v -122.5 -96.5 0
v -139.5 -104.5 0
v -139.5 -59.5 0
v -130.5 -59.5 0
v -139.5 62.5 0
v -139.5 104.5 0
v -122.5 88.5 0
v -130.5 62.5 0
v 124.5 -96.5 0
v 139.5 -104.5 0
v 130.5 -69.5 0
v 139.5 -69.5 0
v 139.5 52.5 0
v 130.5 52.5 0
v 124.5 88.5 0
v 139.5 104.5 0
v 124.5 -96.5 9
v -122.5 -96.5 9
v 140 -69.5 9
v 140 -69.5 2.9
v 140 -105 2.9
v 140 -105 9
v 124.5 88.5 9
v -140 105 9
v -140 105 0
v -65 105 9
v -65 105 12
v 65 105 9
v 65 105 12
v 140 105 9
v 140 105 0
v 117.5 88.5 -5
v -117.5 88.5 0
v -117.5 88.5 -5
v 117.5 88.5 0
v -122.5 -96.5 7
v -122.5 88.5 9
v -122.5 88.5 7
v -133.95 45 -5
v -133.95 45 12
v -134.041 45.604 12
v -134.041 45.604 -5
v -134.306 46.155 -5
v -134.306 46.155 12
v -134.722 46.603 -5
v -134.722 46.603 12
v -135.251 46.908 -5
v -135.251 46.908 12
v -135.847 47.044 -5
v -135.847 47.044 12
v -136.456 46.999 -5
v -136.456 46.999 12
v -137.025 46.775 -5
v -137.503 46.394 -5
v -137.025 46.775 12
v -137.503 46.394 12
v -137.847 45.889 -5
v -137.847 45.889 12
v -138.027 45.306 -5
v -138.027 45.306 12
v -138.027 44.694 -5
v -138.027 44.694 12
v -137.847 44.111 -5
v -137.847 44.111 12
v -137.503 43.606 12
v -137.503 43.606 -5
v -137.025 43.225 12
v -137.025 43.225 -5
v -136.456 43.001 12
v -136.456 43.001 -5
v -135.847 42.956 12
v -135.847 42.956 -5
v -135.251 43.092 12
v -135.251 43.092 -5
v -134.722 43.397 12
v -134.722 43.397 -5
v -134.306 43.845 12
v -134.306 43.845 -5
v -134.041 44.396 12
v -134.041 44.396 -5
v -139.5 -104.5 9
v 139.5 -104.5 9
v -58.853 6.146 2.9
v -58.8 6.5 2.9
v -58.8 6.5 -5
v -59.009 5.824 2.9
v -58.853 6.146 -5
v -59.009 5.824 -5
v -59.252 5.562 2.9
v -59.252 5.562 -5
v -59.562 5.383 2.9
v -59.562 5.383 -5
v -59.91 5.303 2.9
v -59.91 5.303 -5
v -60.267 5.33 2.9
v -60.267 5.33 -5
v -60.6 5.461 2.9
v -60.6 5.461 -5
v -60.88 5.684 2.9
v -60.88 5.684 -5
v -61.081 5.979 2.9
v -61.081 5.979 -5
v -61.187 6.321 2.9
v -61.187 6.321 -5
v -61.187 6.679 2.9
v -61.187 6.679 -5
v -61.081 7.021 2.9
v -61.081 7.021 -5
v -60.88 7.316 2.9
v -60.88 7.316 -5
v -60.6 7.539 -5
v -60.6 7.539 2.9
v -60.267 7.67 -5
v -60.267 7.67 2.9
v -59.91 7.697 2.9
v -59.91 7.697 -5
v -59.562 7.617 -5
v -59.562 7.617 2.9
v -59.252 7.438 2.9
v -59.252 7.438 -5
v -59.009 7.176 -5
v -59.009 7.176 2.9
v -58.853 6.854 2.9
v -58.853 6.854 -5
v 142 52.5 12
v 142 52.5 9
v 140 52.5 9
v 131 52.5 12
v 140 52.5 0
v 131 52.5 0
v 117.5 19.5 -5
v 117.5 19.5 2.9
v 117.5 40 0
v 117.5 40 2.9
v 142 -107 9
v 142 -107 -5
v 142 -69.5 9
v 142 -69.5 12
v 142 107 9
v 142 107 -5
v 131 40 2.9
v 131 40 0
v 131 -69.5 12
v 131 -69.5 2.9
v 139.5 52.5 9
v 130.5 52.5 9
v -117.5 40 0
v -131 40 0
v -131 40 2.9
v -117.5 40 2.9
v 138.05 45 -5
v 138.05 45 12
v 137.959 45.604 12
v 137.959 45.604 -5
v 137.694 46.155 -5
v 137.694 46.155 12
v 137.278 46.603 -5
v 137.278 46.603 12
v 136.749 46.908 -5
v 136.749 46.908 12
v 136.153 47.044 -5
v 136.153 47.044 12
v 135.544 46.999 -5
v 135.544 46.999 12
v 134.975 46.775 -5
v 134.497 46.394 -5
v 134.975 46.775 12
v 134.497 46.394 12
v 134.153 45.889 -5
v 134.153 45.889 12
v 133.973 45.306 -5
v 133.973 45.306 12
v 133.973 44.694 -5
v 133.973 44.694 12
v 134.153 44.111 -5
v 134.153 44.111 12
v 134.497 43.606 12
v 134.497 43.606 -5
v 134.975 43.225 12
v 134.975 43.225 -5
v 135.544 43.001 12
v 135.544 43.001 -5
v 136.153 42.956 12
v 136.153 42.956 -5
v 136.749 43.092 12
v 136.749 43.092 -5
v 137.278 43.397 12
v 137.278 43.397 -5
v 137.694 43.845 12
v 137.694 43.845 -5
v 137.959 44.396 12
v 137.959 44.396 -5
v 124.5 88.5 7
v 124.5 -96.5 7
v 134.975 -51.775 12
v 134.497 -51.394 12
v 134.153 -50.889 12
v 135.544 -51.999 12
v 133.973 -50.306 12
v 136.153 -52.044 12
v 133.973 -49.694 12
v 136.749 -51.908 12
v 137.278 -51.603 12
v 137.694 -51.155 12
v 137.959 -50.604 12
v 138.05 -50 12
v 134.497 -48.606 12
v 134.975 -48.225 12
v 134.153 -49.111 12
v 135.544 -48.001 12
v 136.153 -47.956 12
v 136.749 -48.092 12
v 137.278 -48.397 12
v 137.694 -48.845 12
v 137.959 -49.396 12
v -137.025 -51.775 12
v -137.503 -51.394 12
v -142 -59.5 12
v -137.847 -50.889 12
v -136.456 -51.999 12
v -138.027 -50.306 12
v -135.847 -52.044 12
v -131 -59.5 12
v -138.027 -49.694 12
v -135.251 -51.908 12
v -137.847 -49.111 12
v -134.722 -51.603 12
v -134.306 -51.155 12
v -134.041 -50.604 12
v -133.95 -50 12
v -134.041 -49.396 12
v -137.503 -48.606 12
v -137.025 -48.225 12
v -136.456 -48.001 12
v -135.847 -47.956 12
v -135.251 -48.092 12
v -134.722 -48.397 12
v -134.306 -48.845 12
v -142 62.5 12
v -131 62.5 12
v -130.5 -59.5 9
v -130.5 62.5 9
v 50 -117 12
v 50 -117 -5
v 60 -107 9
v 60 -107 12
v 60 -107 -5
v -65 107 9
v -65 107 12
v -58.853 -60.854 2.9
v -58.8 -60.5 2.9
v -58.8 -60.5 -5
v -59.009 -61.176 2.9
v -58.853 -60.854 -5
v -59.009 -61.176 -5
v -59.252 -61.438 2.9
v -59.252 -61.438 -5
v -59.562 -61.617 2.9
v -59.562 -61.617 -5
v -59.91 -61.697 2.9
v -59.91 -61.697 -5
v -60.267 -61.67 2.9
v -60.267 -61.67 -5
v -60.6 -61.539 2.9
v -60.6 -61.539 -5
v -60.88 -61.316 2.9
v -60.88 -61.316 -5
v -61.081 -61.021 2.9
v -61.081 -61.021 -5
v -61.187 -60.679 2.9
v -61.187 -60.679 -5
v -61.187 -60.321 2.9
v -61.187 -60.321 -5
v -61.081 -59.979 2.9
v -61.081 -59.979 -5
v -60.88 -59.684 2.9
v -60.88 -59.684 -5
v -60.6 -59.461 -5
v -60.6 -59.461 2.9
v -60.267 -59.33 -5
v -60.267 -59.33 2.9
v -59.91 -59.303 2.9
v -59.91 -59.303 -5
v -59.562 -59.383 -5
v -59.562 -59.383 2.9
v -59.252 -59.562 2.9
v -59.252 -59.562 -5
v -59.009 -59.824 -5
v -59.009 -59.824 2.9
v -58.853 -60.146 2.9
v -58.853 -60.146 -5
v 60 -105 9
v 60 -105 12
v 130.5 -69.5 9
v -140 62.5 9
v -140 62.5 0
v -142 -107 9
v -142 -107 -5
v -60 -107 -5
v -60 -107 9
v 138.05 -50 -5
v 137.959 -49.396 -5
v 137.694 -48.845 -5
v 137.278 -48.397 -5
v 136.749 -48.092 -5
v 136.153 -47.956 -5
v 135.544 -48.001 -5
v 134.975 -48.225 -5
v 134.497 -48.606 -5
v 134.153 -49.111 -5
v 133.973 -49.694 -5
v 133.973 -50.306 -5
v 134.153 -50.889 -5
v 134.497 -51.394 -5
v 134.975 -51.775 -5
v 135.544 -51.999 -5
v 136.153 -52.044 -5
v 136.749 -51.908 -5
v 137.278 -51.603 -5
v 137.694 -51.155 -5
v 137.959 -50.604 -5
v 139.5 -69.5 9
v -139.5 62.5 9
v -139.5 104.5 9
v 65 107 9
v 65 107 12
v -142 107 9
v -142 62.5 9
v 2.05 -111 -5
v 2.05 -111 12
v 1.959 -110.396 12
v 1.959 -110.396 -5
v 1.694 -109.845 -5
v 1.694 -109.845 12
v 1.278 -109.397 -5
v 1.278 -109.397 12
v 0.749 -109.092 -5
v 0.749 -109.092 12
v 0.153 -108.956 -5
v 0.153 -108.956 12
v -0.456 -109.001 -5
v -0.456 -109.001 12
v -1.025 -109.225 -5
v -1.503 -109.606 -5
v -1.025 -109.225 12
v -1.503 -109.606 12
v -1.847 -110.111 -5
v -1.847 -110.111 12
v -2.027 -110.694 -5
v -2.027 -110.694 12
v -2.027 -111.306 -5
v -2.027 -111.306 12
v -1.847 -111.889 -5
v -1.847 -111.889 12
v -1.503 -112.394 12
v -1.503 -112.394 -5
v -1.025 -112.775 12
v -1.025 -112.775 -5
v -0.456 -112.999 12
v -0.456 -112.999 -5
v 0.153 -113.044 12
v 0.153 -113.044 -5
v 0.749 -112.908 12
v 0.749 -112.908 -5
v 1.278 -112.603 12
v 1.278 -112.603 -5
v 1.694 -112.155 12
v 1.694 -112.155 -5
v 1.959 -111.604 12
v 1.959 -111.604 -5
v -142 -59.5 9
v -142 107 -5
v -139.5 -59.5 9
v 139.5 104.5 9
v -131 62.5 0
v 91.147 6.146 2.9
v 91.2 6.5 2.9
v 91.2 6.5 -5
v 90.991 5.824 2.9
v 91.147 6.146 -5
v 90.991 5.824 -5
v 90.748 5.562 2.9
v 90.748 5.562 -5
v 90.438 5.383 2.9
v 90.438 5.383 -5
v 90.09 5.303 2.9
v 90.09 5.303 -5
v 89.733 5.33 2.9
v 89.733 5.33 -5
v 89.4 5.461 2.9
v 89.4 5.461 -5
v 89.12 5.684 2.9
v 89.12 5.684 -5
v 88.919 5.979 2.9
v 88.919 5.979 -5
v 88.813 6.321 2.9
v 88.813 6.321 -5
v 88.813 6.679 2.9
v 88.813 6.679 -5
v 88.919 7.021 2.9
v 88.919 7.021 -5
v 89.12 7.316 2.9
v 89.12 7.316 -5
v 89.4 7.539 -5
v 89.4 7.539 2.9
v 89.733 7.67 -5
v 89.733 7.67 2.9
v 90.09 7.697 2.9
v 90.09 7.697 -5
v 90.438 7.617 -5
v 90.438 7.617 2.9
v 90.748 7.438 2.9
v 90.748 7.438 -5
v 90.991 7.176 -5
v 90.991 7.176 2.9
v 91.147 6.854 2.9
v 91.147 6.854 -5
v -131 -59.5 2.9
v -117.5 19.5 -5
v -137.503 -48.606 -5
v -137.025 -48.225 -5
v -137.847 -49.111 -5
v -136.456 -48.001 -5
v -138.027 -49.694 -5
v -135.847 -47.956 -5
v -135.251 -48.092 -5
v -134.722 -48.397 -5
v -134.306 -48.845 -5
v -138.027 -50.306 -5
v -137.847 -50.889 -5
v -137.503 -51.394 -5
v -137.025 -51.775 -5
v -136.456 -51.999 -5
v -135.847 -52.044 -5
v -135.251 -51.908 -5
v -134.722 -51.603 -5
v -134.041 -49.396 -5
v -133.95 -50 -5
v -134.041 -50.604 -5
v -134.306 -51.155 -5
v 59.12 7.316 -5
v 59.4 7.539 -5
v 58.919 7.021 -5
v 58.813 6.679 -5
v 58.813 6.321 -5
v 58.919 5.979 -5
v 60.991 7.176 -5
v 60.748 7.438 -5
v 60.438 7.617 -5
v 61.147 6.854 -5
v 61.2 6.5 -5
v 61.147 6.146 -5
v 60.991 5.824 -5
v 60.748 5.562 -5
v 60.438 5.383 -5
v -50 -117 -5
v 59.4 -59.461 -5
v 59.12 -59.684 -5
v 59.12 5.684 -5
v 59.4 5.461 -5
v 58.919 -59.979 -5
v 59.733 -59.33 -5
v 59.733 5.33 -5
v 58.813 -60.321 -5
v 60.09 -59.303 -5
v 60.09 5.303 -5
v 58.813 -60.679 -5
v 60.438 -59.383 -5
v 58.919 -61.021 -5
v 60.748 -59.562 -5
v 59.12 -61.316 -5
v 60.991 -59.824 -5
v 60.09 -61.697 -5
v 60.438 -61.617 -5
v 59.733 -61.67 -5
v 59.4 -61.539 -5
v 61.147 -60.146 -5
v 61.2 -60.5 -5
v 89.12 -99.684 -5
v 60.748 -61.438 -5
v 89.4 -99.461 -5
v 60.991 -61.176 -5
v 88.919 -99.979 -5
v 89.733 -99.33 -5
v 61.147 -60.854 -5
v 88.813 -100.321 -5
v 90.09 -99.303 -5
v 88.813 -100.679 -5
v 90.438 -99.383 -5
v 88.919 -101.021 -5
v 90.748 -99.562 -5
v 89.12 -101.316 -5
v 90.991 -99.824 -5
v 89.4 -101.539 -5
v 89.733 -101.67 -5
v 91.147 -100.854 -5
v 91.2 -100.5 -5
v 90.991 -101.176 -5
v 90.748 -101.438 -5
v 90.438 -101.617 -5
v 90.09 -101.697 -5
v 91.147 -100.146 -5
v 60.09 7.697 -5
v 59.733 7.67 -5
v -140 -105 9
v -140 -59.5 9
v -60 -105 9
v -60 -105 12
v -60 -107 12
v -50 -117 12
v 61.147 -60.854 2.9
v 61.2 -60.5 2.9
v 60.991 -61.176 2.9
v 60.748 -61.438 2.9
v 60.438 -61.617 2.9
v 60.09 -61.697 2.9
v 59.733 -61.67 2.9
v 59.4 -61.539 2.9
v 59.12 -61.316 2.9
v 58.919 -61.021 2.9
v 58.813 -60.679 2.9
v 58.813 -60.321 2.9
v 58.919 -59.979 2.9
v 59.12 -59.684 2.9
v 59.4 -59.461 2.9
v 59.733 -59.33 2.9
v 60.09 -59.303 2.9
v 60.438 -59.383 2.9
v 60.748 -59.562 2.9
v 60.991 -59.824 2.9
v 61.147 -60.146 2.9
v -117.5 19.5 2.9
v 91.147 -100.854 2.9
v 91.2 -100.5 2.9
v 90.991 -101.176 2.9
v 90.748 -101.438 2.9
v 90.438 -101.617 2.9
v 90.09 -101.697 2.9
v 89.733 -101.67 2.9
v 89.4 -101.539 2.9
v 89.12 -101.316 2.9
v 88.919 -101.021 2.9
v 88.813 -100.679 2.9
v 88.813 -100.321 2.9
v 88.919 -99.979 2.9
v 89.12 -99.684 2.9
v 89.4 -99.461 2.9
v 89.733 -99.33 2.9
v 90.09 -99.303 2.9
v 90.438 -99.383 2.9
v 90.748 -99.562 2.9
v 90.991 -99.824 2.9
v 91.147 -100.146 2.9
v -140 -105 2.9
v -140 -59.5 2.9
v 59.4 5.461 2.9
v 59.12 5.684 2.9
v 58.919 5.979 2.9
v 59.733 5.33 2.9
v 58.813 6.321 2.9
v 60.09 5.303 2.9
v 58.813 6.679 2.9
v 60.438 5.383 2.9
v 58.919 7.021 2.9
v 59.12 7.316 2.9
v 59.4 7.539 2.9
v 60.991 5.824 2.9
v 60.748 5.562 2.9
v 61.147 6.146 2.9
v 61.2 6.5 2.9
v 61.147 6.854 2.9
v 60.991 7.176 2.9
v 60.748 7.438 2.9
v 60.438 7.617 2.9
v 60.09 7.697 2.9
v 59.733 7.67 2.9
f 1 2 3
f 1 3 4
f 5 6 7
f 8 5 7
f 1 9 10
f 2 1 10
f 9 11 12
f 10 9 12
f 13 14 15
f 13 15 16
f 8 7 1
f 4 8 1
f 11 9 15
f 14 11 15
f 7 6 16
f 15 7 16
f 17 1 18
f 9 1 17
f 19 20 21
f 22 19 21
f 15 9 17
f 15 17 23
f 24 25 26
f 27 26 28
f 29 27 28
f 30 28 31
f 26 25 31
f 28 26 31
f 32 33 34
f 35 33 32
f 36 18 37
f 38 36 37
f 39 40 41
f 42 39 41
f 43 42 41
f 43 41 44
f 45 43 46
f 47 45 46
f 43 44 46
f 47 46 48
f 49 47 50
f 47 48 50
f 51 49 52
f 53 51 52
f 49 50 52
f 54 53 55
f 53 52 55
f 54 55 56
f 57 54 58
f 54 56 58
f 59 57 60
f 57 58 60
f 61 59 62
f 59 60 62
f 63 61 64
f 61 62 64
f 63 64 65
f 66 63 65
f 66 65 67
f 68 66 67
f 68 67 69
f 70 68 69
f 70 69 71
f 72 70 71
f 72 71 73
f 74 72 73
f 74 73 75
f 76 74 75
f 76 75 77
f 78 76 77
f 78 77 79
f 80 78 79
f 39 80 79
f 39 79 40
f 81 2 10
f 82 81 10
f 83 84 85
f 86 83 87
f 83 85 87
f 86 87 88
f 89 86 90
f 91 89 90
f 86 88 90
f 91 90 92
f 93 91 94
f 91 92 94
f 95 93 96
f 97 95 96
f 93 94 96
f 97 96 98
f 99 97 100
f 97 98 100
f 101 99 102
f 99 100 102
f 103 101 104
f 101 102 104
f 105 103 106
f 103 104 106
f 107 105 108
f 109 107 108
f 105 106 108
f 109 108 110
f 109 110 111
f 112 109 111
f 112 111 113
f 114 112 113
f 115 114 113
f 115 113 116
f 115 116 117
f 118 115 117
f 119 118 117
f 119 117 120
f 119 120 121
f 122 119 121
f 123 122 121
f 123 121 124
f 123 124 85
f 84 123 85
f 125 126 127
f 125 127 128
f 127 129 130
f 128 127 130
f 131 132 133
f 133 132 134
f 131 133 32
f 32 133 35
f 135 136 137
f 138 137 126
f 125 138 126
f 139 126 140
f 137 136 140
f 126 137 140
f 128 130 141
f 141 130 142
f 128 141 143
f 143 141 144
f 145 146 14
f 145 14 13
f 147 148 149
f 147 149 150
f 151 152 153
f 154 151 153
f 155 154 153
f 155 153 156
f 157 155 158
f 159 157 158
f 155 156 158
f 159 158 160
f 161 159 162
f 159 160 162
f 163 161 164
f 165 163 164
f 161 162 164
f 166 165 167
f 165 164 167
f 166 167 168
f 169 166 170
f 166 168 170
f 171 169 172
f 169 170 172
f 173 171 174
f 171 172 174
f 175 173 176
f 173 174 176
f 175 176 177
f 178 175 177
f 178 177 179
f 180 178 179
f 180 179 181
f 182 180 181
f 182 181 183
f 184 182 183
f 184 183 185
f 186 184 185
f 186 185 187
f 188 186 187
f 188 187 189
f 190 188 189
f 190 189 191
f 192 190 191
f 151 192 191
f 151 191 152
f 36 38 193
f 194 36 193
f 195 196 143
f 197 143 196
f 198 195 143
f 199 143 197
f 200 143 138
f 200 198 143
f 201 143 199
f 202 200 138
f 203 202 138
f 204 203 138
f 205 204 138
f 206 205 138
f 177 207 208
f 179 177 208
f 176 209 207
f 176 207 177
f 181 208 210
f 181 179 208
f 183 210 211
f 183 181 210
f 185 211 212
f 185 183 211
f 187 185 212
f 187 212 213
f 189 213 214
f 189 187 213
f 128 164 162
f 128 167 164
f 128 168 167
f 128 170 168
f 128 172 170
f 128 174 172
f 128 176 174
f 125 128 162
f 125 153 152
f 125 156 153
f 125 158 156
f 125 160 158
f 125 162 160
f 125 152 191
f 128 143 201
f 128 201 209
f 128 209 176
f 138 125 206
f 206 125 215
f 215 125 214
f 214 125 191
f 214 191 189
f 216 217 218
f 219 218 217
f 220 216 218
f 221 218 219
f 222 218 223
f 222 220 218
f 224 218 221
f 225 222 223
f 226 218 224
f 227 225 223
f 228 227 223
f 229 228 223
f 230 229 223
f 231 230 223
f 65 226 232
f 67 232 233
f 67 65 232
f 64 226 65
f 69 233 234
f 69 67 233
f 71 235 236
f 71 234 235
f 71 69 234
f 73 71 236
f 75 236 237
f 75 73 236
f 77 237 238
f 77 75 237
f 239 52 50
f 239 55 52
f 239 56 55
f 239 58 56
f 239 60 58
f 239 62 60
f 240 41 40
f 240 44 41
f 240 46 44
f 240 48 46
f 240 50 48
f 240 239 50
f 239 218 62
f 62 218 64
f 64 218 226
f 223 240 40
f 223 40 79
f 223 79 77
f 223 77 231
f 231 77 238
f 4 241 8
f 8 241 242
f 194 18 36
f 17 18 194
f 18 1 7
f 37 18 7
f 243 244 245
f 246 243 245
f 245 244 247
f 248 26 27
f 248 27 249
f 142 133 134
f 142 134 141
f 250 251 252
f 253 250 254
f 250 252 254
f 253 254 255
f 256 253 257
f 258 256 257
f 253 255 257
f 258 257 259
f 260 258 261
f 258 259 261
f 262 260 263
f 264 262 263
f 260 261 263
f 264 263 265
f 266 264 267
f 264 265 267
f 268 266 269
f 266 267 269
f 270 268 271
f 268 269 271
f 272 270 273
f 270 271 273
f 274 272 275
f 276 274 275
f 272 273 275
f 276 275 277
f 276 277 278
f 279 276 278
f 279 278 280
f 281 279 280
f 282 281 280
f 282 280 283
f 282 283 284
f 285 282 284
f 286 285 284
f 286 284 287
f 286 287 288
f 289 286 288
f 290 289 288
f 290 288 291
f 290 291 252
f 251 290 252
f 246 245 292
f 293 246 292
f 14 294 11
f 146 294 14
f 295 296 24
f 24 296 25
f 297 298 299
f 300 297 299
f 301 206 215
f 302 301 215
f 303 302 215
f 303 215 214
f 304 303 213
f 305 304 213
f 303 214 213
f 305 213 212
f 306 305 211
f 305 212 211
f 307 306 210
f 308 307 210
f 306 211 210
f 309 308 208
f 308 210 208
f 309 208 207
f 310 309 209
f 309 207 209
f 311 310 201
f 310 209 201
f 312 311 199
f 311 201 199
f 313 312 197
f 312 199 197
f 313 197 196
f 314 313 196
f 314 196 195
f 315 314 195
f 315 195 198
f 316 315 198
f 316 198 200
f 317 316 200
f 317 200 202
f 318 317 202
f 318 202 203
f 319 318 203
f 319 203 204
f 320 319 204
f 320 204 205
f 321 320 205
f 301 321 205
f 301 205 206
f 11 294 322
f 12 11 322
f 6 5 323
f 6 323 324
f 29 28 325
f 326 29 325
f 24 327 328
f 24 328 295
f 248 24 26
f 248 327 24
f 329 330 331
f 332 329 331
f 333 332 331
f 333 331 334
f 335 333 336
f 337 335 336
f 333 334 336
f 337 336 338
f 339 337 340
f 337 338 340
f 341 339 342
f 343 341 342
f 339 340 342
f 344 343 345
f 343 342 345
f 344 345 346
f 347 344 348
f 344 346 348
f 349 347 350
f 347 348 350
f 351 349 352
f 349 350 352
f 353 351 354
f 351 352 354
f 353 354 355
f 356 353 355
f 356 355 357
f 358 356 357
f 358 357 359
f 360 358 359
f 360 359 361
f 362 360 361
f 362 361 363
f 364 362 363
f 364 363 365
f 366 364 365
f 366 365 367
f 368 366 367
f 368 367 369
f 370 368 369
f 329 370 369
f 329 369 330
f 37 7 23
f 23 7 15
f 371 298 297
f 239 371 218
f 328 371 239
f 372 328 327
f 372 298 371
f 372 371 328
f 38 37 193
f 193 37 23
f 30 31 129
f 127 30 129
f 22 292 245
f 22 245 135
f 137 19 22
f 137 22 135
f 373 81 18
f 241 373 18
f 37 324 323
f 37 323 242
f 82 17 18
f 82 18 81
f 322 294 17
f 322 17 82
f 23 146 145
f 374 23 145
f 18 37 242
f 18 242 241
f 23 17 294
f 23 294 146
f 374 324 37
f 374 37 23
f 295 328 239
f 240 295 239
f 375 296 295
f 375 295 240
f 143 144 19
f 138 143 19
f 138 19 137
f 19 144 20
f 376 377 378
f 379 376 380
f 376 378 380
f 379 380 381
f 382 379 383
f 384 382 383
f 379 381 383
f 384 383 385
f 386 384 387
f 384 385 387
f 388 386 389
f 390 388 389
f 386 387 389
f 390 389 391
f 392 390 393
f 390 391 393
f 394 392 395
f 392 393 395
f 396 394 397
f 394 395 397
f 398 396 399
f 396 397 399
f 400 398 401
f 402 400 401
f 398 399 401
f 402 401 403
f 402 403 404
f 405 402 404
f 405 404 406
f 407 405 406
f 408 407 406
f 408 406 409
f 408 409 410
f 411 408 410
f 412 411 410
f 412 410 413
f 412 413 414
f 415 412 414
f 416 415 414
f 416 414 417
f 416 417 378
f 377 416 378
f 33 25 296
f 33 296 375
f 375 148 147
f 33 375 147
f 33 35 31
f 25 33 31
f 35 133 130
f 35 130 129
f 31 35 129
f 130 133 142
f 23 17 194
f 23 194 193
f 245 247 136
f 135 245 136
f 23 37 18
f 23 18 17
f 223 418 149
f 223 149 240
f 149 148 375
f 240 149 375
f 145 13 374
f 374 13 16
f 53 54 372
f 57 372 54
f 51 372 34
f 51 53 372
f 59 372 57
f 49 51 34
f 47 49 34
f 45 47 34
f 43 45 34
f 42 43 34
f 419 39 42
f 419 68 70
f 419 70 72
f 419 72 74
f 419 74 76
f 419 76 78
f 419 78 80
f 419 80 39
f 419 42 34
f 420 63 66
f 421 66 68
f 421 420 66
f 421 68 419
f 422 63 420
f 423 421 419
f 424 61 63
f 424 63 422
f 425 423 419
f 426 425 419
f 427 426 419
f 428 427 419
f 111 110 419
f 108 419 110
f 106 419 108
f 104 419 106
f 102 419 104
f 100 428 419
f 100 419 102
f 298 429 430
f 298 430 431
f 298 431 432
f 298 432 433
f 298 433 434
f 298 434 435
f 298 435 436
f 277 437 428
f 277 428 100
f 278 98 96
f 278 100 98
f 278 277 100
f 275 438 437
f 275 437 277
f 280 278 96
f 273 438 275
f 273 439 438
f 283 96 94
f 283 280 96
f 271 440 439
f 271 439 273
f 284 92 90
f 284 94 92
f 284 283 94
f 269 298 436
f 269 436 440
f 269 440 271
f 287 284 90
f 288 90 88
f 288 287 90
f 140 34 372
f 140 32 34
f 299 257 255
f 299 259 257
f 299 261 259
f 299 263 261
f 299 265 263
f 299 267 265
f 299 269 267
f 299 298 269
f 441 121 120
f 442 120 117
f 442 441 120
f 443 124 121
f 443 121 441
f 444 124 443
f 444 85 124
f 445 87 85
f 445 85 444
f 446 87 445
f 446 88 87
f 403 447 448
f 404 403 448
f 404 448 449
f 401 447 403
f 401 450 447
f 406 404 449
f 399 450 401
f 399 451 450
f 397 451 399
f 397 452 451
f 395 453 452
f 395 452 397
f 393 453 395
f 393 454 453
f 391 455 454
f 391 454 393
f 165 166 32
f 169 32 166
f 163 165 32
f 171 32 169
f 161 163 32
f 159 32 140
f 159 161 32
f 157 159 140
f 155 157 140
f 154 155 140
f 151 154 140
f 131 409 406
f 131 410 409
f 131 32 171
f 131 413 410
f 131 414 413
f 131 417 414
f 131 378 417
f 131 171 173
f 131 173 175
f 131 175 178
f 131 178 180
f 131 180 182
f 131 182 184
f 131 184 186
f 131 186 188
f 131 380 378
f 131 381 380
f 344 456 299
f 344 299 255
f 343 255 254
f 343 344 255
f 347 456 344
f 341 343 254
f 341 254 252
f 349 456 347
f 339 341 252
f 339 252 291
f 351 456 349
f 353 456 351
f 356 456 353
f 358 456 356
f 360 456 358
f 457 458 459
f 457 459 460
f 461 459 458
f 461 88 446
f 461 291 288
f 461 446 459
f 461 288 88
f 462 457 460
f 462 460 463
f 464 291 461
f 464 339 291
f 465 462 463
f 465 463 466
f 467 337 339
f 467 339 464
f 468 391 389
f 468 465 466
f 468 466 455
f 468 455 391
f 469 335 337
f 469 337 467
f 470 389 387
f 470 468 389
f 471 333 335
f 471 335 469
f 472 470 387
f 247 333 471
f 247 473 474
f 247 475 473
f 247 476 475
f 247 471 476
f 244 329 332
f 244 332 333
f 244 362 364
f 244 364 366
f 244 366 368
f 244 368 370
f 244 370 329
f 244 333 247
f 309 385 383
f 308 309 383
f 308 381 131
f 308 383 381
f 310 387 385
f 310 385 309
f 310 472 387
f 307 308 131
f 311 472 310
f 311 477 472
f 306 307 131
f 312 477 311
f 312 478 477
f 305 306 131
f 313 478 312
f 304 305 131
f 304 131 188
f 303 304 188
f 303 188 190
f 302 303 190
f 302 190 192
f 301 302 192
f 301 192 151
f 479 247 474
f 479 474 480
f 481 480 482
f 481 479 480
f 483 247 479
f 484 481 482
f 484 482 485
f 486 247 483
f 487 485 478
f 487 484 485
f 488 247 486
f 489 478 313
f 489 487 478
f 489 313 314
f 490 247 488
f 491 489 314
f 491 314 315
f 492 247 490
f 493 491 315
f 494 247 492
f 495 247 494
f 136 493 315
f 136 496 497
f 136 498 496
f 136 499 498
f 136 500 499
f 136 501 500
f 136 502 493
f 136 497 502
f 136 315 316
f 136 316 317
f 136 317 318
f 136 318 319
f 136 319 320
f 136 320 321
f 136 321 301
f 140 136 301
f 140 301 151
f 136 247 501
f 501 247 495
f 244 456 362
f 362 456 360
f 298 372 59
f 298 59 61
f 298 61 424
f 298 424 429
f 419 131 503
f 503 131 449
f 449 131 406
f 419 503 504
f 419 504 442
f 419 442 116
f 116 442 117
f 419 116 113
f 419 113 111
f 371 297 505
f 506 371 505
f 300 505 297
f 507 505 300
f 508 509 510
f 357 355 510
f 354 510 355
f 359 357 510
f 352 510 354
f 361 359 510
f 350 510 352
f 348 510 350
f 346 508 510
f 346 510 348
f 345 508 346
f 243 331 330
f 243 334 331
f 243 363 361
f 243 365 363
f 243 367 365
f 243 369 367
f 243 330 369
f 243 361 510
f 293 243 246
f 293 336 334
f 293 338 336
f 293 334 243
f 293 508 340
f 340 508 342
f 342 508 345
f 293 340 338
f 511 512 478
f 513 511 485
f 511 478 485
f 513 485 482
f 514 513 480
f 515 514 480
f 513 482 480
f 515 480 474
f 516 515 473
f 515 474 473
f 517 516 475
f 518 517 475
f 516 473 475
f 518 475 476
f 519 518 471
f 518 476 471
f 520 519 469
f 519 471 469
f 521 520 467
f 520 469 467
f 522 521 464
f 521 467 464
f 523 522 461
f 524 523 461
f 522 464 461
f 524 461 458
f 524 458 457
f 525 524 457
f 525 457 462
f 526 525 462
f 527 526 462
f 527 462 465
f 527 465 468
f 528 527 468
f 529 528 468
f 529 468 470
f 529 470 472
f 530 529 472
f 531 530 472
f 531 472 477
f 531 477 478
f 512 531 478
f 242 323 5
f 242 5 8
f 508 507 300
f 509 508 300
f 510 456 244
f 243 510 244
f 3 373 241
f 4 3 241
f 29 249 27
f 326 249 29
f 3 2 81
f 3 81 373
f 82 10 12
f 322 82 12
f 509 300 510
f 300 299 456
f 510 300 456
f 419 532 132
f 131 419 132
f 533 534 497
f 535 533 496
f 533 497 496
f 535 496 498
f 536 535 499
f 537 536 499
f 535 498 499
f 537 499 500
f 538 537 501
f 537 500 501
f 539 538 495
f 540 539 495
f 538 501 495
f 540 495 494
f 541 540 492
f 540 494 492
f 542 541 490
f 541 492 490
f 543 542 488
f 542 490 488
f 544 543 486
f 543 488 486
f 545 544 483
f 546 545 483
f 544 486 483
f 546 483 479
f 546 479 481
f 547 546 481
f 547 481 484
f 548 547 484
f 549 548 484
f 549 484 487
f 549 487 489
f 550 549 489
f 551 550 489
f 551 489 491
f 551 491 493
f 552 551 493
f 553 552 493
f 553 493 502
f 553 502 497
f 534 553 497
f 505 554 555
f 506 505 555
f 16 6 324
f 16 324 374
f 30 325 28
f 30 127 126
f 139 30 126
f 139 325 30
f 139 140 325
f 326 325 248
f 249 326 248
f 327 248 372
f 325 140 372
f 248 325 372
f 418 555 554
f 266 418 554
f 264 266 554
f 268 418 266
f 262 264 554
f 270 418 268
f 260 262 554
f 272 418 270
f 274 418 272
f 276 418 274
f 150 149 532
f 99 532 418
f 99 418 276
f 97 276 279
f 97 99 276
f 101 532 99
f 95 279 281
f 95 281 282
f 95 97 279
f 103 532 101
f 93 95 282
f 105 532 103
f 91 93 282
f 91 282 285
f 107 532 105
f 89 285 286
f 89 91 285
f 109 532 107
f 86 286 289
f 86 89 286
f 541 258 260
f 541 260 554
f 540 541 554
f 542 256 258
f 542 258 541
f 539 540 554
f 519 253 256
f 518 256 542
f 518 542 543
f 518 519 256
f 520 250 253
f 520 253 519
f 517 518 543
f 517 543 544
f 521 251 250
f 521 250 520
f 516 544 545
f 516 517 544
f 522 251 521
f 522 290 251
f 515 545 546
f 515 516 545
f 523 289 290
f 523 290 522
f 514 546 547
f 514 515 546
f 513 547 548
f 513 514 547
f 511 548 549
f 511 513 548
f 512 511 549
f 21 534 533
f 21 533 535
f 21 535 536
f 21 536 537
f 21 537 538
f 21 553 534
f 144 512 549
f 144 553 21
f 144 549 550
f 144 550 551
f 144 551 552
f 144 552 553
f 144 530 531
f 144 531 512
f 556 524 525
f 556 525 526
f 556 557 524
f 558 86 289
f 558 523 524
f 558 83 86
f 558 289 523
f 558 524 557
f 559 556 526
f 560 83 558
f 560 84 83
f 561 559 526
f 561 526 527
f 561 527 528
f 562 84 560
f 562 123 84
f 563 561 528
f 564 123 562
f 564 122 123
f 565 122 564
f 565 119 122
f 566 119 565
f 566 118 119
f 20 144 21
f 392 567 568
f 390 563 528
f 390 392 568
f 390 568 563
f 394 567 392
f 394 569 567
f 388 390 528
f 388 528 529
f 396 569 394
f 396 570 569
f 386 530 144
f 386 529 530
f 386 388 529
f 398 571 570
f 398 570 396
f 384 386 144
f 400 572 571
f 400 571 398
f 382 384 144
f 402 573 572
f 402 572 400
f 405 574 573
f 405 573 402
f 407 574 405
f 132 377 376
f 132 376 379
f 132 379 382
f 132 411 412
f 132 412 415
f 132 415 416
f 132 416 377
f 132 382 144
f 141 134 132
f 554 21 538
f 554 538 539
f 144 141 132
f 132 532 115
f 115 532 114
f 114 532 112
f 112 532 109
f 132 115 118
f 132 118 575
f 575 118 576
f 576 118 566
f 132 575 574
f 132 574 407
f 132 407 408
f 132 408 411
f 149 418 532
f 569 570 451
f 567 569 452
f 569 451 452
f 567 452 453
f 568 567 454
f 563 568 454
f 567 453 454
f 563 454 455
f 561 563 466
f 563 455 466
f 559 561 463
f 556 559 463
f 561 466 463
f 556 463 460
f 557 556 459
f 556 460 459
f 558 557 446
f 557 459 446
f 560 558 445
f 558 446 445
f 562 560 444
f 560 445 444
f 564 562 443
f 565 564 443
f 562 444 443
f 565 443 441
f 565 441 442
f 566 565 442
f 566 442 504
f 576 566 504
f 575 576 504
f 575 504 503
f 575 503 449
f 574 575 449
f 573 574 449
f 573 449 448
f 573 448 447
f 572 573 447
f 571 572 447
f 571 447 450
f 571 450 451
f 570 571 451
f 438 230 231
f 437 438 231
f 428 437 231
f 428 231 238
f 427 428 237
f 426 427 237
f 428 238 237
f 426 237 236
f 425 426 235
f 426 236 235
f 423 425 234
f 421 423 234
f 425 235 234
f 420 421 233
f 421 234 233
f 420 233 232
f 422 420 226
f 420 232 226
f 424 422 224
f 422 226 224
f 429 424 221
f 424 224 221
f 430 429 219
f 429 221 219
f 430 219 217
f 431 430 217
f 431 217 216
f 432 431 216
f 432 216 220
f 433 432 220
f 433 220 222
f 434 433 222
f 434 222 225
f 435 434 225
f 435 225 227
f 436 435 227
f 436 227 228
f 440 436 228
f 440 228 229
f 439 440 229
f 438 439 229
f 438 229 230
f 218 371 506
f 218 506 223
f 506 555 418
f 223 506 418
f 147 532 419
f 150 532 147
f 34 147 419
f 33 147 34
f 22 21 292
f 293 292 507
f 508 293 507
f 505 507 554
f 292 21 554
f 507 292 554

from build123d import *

# Parameters (mm, degrees)
F0_W      = 279
F0_H      = 209
F0_W_2    = 247
F0_H_2    = 185
F1_DEPTH  = 9
F2_W      = 9
F2_H      = 122
F3_DEPTH  = 25
F6_DEPTH  = 14
F7_W      = 280
F7_H      = 210
F8_DEPTH  = 5
F9_W      = 280
F9_H      = 145
F10_DEPTH = 2.9
F11_W     = 235
F11_H     = 69
F12_DEPTH = 25
F13_R     = 1.2
F14_DEPTH = 25
F15_W     = 11
F15_H     = 122
F15_W_2   = 130
F15_H_2   = 2
F16_DEPTH = 3
F17_R     = 2.05
F18_DEPTH = 25
F19_W     = 247
F19_H     = 185
F20_DEPTH = 2


with BuildPart() as f1:
    # F0 (on Top) → F1 (new body)
    with BuildSketch(Plane.XY):
        Rectangle(F0_W, F0_H)
        with Locations((1, -4)):
            Rectangle(F0_W_2, F0_H_2, mode=Mode.SUBTRACT)
    extrude(amount=F1_DEPTH)

    # F2 (on face) → F3 (cut)
    with BuildSketch(Plane.XY.offset(9)):
        with Locations((-135, 1.5)):
            Rectangle(F2_W, F2_H)
        with Locations((135, -8.5)):
            Rectangle(F2_W, F2_H)
    extrude(amount=-F3_DEPTH, mode=Mode.SUBTRACT)


with BuildPart() as f6:
    # F5 (on offset) → F6 (new body)
    with BuildSketch(Plane.XY.offset(-5)):
        Polygon((142, 107), (-142, 107), (-142, -107), (-60, -107), (60, -107), (142, -107), align=None)
        Polygon((-140, 62.5), (-140, 105), (140, 105), (140, 52.5), (131, 52.5), (131, -69.5), (140, -69.5), (140, -105), (-140, -105), (-140, -59.5), (-131, -59.5), (-131, 62.5), align=None, mode=Mode.SUBTRACT)
        Polygon((60, -107), (-60, -107), (-50, -117), (50, -117), align=None)
    extrude(amount=F6_DEPTH)

    # F7 (on face) → F8 (join)
    with BuildSketch(Plane(origin=(0, 0, -5), x_dir=(1, 0, 0), z_dir=(0, 0, -1))):
        Rectangle(F7_W, F7_H)
    extrude(amount=-F8_DEPTH)

    # F9 (on face) → F10 (join)
    with BuildSketch(Plane.XY):
        with Locations((0, -32.5)):
            Rectangle(F9_W, F9_H)
    extrude(amount=F10_DEPTH)

    # F11 (on face) → F12 (cut)
    with BuildSketch(Plane.XY.offset(2.9)):
        with Locations((0, 54)):
            Rectangle(F11_W, F11_H)
    extrude(amount=-F12_DEPTH, mode=Mode.SUBTRACT)

    # F13 (on face) → F14 (cut)
    with BuildSketch(Plane(origin=(0, 0, -5), x_dir=(1, 0, 0), z_dir=(0, 0, -1))):
        with Locations((90, -6.5)):
            Circle(F13_R)
        with Locations((90, 100.5)):
            Circle(F13_R)
        with Locations((60, 60.5)):
            Circle(F13_R)
        with Locations((60, -6.5)):
            Circle(F13_R)
        with Locations((-60, 60.5)):
            Circle(F13_R)
        with Locations((-60, -6.5)):
            Circle(F13_R)
    extrude(amount=-F14_DEPTH, mode=Mode.SUBTRACT)

    # F15 (on face) → F16 (join)
    with BuildSketch(Plane.XY.offset(9)):
        with Locations((-136.5, 1.5)):
            Rectangle(F15_W, F15_H)
        with Locations((136.5, -8.5)):
            Rectangle(F15_W, F15_H)
        with Locations((0, 106)):
            Rectangle(F15_W_2, F15_H_2)
        Polygon((-60, -107), (-50, -117), (50, -117), (60, -107), (60, -105), (-60, -105), align=None)
    extrude(amount=F16_DEPTH)

    # F17 (on face) → F18 (cut)
    with BuildSketch(Plane.XY.offset(12)):
        with Locations((-136, 45)):
            Circle(F17_R)
        with Locations((-136, -50)):
            Circle(F17_R)
        with Locations((136, -50)):
            Circle(F17_R)
        with Locations((136, 45)):
            Circle(F17_R)
        with Locations((0, -111)):
            Circle(F17_R)
    extrude(amount=-F18_DEPTH, mode=Mode.SUBTRACT)


with BuildPart() as f20:
    # F19 (on face) → F20 (new body)
    with BuildSketch(Plane.XY.offset(9)):
        with Locations((1, -4)):
            Rectangle(F19_W, F19_H)
    extrude(amount=-F20_DEPTH)


solid = Compound([f1.part, f6.part, f20.part])
